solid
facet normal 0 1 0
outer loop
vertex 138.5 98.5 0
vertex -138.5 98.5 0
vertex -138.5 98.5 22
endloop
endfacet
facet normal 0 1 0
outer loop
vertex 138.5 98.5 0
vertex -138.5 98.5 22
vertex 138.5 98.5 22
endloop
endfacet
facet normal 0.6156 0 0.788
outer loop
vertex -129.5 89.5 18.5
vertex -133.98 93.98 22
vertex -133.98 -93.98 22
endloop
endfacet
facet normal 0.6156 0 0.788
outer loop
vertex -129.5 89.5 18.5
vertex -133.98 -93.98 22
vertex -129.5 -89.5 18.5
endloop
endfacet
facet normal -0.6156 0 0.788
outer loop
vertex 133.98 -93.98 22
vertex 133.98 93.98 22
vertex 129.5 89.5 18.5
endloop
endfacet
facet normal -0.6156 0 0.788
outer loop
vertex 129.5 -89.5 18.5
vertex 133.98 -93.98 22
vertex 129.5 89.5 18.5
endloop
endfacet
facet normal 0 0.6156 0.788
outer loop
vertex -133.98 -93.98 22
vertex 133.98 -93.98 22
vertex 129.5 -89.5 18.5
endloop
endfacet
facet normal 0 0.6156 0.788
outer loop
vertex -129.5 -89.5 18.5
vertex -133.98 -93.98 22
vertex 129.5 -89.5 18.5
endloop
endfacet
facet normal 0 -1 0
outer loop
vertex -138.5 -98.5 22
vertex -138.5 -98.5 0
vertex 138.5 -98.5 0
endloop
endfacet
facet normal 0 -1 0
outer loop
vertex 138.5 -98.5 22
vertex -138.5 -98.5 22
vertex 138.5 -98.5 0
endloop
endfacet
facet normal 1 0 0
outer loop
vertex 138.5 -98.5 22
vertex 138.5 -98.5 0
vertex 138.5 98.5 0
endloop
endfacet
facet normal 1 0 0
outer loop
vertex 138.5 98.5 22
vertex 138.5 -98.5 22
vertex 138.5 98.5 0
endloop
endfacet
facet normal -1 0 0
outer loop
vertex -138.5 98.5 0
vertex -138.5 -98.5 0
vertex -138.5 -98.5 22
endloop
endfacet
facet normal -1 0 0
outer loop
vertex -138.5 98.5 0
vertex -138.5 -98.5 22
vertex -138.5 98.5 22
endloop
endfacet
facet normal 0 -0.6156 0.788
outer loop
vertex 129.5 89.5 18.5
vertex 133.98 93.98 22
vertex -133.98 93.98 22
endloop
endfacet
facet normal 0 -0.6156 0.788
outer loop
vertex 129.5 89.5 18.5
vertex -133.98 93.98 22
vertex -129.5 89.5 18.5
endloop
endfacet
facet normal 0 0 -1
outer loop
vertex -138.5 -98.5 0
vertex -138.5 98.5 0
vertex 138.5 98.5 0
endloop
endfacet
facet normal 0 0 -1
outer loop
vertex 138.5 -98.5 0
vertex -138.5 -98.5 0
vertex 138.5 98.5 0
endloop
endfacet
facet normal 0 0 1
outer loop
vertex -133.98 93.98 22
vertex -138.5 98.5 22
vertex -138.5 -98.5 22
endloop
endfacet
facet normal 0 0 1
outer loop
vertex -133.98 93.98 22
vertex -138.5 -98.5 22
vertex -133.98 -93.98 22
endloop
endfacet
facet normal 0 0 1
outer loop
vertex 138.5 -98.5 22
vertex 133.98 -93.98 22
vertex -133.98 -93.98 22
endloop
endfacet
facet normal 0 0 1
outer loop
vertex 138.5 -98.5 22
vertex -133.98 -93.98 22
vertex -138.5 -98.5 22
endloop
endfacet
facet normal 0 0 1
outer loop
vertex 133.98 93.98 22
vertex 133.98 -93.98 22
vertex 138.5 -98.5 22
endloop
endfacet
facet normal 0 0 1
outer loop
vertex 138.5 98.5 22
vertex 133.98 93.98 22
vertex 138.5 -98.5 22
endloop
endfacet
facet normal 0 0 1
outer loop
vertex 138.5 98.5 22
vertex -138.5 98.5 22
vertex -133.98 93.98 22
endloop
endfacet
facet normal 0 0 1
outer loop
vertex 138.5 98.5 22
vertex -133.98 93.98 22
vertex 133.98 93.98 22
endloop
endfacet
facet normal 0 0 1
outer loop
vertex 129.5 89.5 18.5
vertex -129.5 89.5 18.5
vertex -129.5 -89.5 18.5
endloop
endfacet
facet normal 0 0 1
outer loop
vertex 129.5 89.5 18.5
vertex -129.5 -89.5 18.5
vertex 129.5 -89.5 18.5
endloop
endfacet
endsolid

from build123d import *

# Parameters (mm, degrees)
F0_W         = 277
F0_H         = 197
F1_DEPTH     = 22
F2_W         = 268
F2_H         = 188
F3_DEPTH     = 3.5
F4_T4_DEPTH  = 188
F4_T9_DEPTH  = 268
F4_T14_DEPTH = 188
F4_T19_DEPTH = 268


# Not quite as in the source:
# - a fillet or chamfer that OpenCascade refuses, or shapes differently, is made with other operations: its cross-section is extruded or revolved along the edge and cut away or added


with BuildPart() as f1:
    # F0 (on Top) → F1 (new body)
    with BuildSketch(Plane.XY):
        Rectangle(F0_W, F0_H)
    extrude(amount=F1_DEPTH)

    # F2 (on face) → F3 (cut)
    with BuildSketch(Plane.XY.offset(22)):
        Rectangle(F2_W, F2_H)
    extrude(amount=-F3_DEPTH, mode=Mode.SUBTRACT)

    # F4: chamfer of 4.5 x 3.5157853193 on 4 edges, made by hand


with BuildPart() as f4_tool2:
    # F4_s3 → F4_t4 (new body)
    with BuildSketch(Plane.XZ.offset(94)):
        Polygon((134, 22.0157853193), (129.5, 18.5), (134, 18.5), align=None)
    extrude(amount=-F4_T4_DEPTH)

    split(bisect_by=Plane.XY.offset(22), keep=Keep.BOTTOM)


with BuildPart() as f1_1:
    add(f1.part)

    # F4_t1: union F4_tool2
    add(f4_tool2.part)


with BuildPart() as f4_tool7:
    # F4_s8 → F4_t9 (new body)
    with BuildSketch(Plane.YZ.offset(134)):
        Polygon((94, 22.0157853193), (89.5, 18.5), (94, 18.5), align=None)
    extrude(amount=-F4_T9_DEPTH)

    split(bisect_by=Plane.XY.offset(22), keep=Keep.BOTTOM)


with BuildPart() as f1_2:
    add(f1_1.part)

    # F4_t6: union F4_tool7
    add(f4_tool7.part)


with BuildPart() as f4_tool12:
    # F4_s13 → F4_t14 (new body)
    with BuildSketch(Plane.XZ.offset(-94)):
        Polygon((-134, 22.0157853193), (-129.5, 18.5), (-134, 18.5), align=None)
    extrude(amount=F4_T14_DEPTH)

    split(bisect_by=Plane.XY.offset(22), keep=Keep.BOTTOM)


with BuildPart() as f1_3:
    add(f1_2.part)

    # F4_t11: union F4_tool12
    add(f4_tool12.part)


with BuildPart() as f4_tool17:
    # F4_s18 → F4_t19 (new body)
    with BuildSketch(Plane.YZ.offset(-134)):
        Polygon((-94, 22.0157853193), (-89.5, 18.5), (-94, 18.5), align=None)
    extrude(amount=F4_T19_DEPTH)

    split(bisect_by=Plane.XY.offset(22), keep=Keep.BOTTOM)


with BuildPart() as f1_4:
    add(f1_3.part)

    # F4_t16: union F4_tool17
    add(f4_tool17.part)


solid = f1_4.part
